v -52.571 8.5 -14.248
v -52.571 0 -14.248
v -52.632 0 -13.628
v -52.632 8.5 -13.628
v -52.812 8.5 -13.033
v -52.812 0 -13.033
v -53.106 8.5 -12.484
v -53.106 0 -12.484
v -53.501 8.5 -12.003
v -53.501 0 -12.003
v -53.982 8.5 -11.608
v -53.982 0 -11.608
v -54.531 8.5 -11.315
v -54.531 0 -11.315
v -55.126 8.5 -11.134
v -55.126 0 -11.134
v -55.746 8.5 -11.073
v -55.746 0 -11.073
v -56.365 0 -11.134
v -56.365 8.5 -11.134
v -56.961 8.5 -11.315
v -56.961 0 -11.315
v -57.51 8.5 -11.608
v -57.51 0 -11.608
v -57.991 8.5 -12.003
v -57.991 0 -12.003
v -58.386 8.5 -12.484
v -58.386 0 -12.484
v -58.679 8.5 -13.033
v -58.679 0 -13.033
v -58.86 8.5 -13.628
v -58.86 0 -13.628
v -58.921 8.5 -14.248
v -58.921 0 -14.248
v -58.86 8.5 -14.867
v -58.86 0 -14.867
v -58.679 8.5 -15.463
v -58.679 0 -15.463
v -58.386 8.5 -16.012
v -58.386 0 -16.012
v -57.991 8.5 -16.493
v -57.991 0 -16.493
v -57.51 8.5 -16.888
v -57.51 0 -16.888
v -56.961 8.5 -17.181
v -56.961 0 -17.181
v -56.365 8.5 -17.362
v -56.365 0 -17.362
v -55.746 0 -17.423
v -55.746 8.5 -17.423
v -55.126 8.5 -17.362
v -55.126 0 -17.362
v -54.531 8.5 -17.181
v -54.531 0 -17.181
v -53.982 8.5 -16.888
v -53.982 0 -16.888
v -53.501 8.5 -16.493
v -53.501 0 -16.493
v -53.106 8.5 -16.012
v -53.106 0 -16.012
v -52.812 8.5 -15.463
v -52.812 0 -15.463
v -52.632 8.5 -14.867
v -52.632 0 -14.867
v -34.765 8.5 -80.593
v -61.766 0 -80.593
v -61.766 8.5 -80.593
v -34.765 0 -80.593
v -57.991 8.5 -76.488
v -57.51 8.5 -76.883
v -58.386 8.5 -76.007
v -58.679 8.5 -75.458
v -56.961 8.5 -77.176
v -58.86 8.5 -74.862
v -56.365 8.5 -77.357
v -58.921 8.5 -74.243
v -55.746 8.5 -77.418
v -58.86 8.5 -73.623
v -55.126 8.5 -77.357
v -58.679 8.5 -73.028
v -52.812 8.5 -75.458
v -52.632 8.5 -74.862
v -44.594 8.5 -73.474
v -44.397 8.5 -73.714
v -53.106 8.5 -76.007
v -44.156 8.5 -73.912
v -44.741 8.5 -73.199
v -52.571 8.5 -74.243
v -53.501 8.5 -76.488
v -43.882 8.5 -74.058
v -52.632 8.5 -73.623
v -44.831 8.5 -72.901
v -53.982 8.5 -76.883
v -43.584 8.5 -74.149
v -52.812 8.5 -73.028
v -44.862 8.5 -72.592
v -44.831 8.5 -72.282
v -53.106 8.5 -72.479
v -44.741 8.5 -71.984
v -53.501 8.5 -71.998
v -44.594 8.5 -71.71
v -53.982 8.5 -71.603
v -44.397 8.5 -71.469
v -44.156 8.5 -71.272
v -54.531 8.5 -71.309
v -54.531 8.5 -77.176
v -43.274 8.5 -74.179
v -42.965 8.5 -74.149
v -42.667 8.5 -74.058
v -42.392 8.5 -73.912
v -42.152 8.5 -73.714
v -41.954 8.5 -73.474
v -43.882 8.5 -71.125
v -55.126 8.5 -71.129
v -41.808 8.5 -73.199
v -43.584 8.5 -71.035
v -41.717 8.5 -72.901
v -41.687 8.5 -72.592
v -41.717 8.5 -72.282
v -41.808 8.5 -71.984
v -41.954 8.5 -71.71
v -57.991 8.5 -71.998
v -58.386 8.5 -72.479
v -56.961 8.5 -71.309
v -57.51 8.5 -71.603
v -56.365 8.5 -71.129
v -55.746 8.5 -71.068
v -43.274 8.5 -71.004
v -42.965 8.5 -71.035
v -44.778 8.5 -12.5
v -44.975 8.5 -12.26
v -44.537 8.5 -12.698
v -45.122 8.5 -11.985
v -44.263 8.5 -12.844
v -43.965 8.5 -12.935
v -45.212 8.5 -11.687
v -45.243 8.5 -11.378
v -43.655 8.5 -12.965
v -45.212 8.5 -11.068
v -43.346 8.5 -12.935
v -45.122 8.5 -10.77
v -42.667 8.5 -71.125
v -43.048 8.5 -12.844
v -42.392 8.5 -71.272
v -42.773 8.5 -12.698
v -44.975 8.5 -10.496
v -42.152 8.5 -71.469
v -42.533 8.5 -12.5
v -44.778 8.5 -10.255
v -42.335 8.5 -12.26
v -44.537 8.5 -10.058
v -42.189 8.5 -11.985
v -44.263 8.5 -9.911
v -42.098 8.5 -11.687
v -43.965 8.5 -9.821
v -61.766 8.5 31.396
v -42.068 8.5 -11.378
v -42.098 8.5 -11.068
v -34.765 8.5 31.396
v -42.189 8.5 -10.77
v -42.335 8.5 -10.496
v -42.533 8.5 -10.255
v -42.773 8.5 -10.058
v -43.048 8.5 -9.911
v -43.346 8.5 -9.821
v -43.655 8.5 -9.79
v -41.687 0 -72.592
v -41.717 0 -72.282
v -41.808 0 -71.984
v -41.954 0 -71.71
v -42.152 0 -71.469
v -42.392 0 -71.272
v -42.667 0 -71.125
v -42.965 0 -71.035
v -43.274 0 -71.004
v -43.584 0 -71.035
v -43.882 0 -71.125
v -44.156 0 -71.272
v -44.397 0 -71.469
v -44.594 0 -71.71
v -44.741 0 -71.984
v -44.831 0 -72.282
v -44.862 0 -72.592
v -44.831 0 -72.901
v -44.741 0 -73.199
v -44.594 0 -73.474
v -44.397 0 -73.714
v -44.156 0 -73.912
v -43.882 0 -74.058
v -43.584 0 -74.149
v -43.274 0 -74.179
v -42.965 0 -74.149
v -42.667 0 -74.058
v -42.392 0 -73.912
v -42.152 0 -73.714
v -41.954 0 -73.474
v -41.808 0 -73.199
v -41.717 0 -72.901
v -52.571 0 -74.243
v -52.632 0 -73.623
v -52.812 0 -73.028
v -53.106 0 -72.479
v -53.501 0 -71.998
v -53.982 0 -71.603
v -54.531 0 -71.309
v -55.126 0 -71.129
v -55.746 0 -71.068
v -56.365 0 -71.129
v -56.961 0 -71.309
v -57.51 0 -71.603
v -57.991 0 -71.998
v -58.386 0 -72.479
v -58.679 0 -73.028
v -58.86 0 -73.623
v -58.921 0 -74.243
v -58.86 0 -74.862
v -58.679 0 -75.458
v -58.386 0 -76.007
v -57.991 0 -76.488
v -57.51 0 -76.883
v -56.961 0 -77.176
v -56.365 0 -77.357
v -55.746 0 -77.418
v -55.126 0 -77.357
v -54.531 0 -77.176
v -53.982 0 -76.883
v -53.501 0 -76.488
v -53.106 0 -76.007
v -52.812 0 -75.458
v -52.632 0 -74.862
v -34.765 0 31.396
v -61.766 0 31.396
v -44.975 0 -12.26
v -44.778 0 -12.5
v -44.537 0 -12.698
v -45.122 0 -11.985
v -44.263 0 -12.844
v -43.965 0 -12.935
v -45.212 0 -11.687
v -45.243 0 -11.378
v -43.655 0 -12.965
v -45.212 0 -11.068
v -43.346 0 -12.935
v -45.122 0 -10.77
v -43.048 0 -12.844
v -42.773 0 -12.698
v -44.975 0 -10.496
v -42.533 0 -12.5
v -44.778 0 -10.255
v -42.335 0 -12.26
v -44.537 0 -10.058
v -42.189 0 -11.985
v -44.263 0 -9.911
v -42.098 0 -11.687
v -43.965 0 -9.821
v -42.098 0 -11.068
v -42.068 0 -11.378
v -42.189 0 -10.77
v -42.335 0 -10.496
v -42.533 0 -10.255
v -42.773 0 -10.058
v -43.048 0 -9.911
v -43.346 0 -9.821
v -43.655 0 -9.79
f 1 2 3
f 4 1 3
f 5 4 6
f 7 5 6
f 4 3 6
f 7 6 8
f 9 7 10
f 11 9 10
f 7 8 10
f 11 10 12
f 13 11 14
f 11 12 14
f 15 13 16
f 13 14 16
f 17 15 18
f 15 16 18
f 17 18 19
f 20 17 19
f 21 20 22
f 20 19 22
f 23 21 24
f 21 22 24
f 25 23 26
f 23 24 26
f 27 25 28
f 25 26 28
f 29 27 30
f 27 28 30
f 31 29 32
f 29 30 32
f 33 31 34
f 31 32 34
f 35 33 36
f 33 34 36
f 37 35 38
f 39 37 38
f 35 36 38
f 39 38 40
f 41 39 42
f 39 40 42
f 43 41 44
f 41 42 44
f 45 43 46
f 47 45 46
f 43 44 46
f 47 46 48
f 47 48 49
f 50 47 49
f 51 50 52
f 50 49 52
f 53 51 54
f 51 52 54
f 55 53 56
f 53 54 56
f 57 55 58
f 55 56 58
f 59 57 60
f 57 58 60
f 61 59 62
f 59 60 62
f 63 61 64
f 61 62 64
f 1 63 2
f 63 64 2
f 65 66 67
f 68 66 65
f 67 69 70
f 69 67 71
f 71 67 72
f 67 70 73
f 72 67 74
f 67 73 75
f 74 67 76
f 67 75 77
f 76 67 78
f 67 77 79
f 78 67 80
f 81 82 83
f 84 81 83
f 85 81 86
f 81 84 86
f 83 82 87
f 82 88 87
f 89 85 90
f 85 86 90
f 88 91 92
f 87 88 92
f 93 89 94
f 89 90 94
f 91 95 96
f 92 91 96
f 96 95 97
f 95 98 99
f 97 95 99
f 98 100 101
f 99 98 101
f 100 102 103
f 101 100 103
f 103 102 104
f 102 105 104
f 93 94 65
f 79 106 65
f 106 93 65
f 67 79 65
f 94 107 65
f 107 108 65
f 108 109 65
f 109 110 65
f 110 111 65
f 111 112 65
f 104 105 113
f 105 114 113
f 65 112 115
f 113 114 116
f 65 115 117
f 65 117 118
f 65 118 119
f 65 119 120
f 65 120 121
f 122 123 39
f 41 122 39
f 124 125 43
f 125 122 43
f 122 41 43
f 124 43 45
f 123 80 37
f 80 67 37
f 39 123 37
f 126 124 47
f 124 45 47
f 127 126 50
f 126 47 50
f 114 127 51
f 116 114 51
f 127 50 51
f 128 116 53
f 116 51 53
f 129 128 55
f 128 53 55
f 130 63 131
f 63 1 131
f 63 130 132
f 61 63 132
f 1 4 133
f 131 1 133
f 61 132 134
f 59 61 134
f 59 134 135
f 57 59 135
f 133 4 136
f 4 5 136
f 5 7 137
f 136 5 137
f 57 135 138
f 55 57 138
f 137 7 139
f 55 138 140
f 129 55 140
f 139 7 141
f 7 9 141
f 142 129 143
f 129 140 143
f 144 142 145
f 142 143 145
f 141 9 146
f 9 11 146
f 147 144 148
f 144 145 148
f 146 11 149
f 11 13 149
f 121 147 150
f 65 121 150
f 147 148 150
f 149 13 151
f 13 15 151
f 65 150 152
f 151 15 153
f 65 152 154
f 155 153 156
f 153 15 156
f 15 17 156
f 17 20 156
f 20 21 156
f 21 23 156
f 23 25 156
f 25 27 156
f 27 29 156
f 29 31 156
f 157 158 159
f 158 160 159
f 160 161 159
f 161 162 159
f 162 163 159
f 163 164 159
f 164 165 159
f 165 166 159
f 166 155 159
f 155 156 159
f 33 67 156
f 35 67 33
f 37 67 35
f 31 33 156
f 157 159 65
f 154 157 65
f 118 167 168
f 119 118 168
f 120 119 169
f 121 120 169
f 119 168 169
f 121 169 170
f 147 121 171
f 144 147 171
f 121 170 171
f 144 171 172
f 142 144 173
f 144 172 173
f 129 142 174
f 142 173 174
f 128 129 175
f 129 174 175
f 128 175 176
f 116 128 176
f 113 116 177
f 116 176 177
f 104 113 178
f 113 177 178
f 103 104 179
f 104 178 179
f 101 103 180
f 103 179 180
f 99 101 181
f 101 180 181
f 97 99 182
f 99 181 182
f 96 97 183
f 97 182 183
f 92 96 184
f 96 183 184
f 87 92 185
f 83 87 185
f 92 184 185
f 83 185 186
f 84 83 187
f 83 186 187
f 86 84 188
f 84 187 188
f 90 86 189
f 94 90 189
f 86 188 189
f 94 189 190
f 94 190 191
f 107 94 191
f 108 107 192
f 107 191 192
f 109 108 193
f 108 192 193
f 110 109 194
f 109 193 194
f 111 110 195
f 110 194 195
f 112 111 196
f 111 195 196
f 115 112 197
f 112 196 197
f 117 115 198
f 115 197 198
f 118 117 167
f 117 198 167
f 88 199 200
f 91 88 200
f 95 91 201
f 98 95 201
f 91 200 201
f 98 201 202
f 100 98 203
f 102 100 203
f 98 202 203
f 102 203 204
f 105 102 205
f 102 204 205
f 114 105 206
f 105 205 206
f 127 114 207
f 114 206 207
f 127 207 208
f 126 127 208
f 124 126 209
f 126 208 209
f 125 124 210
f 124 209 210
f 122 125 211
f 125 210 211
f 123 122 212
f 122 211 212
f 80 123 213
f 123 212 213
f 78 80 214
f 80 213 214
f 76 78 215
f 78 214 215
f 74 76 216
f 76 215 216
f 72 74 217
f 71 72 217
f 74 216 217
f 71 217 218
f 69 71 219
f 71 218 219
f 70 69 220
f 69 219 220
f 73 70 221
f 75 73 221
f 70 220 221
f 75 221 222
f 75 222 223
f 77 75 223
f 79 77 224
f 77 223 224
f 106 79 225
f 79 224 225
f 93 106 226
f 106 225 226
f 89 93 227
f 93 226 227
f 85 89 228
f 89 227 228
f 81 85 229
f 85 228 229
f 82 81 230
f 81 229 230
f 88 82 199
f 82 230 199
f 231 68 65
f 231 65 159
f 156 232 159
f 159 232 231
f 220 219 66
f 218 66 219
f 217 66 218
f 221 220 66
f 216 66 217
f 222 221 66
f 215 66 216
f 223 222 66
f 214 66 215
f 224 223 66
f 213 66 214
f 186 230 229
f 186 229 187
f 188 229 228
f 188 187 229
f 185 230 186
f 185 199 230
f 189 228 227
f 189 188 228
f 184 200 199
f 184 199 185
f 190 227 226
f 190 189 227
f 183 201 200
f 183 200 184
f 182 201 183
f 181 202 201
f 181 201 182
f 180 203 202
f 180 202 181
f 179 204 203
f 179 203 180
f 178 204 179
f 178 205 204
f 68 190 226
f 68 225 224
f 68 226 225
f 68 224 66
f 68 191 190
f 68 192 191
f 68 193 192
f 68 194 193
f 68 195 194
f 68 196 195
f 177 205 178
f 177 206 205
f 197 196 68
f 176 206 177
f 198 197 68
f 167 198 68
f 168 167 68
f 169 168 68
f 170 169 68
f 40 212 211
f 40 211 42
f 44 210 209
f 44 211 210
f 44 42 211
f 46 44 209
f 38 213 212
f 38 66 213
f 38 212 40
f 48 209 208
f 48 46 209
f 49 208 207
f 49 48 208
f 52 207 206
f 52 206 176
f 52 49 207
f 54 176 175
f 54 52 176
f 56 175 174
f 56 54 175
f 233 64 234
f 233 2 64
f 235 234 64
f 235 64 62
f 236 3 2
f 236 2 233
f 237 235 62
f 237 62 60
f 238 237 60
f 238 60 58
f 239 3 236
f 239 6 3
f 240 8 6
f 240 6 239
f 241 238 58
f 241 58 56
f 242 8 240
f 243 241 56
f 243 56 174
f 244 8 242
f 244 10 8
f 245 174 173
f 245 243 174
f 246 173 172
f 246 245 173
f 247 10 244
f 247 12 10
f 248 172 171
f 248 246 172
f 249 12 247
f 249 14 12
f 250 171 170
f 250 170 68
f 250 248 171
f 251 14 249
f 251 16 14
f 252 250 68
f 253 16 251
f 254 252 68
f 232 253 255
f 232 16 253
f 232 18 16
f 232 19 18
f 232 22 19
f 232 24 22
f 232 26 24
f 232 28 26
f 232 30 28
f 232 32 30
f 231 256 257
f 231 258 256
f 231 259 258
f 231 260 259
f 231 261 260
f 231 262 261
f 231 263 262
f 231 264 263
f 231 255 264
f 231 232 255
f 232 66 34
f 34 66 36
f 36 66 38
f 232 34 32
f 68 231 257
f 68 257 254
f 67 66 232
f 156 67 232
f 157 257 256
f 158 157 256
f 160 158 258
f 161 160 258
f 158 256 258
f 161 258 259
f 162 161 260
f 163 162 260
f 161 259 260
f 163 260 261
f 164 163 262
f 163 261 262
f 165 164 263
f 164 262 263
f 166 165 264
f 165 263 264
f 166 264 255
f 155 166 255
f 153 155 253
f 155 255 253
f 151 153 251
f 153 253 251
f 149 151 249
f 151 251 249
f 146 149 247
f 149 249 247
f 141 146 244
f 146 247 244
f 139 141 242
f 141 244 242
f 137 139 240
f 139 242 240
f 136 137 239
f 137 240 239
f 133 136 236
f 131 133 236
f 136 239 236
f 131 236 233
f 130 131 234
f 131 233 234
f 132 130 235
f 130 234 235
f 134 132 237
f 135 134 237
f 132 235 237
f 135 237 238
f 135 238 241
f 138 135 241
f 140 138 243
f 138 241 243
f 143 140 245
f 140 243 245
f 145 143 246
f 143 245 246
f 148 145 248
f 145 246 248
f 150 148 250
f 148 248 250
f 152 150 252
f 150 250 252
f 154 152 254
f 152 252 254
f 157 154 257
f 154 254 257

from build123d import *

# Parameters (mm, degrees)
F0_W     = 27.0002
F0_H     = 111.9886
F0_R     = 3.175
F0_R_2   = 1.5875
F1_DEPTH = 8.5


with BuildPart() as f1:
    # F0 (on Front) → F1 (new body)
    with BuildSketch(Plane.XZ):
        with Locations((-48.265494, -24.59839)):
            Rectangle(F0_W, F0_H)
        with Locations((-55.745794, -74.24269)):
            Circle(F0_R, mode=Mode.SUBTRACT)
        with Locations((-43.274394, -72.59169)):
            Circle(F0_R_2, mode=Mode.SUBTRACT)
        with Locations((-55.745794, -14.24789)):
            Circle(F0_R, mode=Mode.SUBTRACT)
        with Locations((-43.655394, -11.37769)):
            Circle(F0_R_2, mode=Mode.SUBTRACT)
    extrude(amount=-F1_DEPTH)


solid = f1.part
